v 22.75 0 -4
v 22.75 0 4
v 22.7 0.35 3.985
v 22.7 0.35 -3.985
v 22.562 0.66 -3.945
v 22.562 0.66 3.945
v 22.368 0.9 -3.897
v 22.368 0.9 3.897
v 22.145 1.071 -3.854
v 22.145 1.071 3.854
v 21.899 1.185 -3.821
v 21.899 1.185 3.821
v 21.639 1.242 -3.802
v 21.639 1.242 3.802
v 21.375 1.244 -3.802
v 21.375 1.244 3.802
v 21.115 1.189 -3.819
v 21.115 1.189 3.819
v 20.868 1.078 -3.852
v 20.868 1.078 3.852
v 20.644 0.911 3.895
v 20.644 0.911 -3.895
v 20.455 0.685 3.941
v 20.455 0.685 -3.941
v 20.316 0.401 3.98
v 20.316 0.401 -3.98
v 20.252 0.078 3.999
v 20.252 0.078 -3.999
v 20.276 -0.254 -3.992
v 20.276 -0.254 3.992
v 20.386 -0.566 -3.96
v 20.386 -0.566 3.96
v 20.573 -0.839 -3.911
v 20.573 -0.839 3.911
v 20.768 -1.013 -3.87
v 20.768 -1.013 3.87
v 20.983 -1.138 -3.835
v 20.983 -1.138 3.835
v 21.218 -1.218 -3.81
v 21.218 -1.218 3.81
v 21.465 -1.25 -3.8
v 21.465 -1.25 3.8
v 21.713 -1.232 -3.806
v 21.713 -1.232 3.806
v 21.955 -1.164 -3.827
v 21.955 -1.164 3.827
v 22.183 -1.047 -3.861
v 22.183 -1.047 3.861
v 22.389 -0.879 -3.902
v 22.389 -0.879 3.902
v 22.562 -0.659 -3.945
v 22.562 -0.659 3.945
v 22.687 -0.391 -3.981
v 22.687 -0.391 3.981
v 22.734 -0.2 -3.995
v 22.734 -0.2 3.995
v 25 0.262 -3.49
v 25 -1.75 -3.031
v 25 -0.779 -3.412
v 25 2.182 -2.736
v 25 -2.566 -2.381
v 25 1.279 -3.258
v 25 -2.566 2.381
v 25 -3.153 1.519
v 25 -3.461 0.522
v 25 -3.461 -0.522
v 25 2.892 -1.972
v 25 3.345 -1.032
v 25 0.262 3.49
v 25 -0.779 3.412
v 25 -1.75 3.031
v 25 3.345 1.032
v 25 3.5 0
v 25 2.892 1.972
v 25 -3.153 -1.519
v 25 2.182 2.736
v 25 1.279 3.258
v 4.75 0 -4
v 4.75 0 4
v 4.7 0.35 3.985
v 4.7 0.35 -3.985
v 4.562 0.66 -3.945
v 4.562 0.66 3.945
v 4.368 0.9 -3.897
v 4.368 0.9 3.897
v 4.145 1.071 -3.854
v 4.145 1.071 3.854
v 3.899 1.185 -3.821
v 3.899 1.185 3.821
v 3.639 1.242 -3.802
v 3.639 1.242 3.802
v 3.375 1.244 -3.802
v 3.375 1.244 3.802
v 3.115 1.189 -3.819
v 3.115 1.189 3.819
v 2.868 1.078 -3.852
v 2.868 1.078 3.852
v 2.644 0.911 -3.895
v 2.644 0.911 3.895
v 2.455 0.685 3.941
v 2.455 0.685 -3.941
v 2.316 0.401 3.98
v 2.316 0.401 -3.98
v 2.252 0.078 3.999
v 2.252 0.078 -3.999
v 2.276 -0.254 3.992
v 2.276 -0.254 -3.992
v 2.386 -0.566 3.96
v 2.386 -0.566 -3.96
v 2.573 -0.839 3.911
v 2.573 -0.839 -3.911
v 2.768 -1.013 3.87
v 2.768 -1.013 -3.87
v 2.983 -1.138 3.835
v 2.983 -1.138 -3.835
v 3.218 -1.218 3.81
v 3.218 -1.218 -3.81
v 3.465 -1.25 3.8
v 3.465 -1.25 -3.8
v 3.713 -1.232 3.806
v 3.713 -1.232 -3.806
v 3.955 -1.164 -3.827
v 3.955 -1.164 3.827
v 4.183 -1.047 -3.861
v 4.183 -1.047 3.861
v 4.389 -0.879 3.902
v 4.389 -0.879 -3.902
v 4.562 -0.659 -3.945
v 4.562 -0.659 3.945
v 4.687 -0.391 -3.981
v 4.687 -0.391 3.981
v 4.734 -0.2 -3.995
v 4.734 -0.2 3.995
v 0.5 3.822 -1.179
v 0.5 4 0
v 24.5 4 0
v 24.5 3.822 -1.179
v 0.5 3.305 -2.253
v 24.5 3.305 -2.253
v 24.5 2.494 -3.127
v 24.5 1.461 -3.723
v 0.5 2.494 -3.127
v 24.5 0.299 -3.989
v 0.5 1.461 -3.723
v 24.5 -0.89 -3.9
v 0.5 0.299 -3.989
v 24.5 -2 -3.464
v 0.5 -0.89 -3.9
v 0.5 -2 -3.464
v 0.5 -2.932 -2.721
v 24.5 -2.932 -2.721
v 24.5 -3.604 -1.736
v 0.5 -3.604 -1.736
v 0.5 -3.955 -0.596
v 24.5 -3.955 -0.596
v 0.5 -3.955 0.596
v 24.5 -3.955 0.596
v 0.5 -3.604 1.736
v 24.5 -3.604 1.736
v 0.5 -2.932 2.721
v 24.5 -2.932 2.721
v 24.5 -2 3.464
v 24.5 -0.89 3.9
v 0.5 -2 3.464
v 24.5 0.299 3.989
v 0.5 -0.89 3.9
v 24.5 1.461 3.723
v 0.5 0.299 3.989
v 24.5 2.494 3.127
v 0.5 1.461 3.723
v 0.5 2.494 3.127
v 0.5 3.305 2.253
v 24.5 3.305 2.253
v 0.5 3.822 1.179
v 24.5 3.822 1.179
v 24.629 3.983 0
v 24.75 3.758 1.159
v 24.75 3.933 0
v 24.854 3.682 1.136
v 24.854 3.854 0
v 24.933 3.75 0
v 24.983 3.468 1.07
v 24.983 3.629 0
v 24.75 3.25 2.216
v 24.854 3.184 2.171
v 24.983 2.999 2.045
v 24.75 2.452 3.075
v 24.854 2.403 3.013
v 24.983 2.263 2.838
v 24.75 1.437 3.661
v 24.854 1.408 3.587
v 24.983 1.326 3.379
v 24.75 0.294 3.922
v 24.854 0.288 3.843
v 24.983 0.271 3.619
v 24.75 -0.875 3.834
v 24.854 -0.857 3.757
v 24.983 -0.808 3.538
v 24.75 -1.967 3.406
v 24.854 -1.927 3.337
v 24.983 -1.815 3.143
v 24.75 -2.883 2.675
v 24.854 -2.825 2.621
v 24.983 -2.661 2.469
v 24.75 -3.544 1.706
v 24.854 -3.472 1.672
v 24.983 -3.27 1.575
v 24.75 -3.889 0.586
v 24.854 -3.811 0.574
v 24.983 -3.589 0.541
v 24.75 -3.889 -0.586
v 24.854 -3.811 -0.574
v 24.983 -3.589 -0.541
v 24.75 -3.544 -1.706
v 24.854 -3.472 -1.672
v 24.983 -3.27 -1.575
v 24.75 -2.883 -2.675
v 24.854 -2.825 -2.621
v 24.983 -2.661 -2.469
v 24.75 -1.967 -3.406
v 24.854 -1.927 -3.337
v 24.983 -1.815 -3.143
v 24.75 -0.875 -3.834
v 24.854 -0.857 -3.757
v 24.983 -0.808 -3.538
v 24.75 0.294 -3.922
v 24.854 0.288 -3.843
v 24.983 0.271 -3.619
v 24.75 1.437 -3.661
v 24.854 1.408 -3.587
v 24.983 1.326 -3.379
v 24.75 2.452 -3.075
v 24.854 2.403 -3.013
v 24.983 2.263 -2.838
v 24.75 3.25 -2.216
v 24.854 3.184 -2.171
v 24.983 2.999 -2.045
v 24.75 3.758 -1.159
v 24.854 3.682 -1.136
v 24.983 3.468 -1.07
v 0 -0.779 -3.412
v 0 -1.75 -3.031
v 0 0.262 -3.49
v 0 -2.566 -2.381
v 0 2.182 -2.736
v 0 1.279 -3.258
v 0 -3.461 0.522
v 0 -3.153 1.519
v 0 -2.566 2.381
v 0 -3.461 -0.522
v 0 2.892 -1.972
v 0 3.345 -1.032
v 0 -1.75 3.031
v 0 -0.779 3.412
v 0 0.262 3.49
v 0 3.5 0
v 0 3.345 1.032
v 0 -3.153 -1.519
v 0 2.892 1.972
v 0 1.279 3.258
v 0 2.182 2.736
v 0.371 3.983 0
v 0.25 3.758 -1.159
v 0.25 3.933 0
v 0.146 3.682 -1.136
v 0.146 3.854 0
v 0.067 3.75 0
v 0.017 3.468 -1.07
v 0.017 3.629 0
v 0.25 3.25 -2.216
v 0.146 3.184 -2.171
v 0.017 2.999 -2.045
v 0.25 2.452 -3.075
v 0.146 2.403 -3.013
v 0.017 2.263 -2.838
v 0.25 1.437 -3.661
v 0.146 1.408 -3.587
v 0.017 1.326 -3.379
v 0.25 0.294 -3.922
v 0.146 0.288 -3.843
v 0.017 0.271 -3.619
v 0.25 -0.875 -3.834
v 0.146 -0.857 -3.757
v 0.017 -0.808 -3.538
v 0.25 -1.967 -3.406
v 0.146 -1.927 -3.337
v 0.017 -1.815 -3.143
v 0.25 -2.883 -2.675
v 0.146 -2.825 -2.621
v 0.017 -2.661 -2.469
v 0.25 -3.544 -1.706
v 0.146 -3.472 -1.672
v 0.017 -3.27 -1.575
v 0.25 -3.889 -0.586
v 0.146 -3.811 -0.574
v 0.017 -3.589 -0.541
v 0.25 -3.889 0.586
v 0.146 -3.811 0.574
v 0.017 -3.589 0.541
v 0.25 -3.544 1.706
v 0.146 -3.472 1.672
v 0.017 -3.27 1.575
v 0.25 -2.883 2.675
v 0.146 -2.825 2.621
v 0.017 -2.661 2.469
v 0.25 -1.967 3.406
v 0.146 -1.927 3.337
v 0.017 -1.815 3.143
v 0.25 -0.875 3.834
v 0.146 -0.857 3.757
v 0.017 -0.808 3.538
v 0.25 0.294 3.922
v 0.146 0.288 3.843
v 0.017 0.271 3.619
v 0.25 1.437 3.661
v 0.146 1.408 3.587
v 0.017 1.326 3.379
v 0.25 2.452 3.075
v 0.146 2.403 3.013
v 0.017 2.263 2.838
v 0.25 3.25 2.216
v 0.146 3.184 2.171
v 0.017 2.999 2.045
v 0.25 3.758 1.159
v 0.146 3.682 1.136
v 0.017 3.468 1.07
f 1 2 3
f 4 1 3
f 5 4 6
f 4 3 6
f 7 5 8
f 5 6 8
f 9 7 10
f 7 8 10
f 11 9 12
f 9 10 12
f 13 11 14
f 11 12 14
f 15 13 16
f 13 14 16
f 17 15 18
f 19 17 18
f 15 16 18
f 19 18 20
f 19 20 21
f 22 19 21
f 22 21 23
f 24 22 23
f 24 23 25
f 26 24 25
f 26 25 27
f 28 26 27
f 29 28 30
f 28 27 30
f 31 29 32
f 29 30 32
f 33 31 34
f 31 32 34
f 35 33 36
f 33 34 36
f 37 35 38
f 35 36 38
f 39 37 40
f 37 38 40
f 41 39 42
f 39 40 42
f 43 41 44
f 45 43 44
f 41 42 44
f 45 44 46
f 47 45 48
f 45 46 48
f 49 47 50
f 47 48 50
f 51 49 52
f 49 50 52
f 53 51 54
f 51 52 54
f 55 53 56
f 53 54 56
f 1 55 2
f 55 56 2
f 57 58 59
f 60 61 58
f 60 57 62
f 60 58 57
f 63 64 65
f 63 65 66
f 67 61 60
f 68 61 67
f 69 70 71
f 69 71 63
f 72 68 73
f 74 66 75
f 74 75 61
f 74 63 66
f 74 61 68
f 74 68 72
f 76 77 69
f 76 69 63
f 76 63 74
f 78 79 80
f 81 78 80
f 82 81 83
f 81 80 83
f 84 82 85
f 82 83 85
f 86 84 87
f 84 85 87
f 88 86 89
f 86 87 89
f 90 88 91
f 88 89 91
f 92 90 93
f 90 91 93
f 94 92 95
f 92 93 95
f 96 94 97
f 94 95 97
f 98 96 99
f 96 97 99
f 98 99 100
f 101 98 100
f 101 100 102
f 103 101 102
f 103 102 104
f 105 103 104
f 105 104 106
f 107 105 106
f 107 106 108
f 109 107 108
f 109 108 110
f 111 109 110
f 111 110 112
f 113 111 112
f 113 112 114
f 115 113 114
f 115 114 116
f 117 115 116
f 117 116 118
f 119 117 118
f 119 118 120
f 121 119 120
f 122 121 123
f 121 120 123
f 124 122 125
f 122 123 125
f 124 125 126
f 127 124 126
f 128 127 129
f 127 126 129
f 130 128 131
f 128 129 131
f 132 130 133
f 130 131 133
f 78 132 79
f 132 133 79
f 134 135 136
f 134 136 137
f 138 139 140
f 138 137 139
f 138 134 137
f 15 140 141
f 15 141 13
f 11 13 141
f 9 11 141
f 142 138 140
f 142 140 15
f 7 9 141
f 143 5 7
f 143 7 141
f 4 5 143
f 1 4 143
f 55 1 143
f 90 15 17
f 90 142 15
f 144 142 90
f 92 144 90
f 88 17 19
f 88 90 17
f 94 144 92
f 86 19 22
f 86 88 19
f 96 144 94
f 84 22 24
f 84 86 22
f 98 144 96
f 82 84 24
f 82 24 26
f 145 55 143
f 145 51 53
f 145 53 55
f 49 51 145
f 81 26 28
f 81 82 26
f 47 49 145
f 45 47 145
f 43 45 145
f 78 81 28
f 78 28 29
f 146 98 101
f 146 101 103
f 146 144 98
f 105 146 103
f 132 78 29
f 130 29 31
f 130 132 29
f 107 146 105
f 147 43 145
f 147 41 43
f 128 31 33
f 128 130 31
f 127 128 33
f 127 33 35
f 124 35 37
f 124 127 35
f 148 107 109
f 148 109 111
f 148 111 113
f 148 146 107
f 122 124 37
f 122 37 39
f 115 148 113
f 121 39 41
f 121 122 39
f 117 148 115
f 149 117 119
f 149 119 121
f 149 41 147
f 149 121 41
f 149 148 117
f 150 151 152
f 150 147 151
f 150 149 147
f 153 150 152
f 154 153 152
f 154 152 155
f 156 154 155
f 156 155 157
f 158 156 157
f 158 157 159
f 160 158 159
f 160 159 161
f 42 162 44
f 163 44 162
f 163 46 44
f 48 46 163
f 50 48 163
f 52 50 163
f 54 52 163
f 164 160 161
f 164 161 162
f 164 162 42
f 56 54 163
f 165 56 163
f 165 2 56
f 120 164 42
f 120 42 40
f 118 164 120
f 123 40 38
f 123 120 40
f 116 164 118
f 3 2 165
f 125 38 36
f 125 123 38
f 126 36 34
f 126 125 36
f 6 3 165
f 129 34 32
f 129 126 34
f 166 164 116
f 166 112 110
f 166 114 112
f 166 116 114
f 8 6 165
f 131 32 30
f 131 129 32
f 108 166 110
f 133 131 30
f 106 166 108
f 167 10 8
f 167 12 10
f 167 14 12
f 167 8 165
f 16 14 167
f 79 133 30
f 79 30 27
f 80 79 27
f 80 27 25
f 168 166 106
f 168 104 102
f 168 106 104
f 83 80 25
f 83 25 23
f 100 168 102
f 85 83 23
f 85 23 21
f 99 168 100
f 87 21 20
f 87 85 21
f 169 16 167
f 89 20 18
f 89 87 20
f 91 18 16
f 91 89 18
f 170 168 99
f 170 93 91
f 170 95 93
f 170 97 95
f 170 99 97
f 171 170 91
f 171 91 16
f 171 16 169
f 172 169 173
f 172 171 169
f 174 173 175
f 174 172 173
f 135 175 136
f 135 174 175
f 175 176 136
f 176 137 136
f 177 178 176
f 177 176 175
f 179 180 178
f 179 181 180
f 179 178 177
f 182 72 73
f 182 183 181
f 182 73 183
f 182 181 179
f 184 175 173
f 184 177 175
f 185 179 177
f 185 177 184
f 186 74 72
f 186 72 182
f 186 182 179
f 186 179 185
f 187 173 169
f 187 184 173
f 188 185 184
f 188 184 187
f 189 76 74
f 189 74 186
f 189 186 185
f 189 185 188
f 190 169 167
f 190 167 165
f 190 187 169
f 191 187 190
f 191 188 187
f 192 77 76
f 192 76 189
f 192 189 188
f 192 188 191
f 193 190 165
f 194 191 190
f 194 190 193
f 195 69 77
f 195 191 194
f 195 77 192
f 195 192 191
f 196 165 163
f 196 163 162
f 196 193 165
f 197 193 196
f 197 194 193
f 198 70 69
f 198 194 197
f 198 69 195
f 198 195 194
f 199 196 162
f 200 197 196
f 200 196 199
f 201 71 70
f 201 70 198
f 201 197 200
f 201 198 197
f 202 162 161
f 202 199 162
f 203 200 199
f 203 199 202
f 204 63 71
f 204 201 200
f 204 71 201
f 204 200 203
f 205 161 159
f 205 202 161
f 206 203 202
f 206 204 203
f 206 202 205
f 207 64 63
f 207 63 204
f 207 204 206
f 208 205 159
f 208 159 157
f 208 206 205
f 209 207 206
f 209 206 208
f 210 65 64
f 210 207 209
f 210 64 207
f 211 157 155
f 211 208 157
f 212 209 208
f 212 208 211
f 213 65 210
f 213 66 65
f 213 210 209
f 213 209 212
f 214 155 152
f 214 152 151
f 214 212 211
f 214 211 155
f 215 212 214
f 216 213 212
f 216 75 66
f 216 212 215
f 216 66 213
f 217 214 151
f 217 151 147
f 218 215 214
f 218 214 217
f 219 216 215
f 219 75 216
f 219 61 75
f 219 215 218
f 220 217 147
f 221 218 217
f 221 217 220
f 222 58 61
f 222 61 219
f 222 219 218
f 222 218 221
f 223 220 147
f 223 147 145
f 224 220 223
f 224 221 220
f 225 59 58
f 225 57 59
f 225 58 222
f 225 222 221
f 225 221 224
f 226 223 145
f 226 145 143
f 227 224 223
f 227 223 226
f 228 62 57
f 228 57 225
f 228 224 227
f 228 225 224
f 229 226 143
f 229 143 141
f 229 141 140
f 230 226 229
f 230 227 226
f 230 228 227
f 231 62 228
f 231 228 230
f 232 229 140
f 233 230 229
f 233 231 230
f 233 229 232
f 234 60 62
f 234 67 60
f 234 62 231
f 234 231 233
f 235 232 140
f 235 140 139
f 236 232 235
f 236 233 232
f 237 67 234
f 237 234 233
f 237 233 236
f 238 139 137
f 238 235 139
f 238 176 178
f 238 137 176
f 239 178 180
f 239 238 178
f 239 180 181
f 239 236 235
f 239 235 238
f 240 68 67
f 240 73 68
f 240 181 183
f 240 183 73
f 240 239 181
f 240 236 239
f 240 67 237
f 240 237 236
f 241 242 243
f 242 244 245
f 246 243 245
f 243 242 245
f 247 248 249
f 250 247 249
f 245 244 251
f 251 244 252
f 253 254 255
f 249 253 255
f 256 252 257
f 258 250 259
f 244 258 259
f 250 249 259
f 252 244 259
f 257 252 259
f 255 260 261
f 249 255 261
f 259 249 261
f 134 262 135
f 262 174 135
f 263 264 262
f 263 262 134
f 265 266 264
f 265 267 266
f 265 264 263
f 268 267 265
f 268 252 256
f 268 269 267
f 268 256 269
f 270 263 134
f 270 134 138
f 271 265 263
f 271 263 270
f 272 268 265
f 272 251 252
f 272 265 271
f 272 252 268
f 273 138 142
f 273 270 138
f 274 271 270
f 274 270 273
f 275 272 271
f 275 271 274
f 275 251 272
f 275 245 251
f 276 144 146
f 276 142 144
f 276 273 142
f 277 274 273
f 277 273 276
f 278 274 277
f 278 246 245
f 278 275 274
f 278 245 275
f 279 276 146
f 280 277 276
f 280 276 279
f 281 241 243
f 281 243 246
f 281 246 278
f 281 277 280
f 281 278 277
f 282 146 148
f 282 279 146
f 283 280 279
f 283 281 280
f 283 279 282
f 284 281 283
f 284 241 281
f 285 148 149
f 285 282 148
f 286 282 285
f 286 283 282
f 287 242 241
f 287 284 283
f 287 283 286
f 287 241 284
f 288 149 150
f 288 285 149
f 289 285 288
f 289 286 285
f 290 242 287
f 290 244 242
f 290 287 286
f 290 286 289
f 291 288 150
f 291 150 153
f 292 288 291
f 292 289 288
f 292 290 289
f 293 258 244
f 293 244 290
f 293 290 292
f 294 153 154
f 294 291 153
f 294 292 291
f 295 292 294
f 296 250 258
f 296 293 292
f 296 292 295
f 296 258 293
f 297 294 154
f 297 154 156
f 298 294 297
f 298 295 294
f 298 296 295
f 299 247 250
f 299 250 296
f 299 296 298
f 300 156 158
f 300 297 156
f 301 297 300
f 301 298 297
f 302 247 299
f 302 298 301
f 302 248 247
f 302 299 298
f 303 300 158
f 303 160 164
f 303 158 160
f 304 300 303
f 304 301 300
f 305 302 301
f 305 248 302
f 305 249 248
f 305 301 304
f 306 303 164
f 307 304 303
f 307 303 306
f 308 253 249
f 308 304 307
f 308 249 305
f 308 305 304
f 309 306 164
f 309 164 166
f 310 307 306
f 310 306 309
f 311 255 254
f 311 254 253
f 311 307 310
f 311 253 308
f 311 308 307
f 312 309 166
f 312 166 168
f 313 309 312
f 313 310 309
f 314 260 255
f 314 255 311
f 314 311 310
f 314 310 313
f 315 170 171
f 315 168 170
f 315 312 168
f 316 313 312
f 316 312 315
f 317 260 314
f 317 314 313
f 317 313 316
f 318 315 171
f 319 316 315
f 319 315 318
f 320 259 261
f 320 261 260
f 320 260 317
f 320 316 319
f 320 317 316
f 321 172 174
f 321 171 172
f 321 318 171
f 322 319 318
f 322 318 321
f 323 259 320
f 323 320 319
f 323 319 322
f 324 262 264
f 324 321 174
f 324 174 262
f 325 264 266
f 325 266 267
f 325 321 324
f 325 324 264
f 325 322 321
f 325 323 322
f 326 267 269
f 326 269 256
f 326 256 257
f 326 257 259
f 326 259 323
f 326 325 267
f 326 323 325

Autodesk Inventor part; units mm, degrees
ref_plane "YZ Plane" through (0, 0, 0) normal (1, 0, 0) x (0, 1, 0)
ref_plane "XZ Plane" through (0, 0, 0) normal (0, 1, 0) x (-1, 0, 0)
sketch "Sketch1" plane through (0, 0, 0) normal (1, 0, 0) x (0, 1, 0)
  circle A0 centre (0, 0) radius 4
  dimension "d0" = 8
extrude "Extrusion1" add sketch "Sketch1" along normal blind 25
fillet "Fillet1" radius 0.5 2 edges at (0, -4, 0) (25, -4, 0)
ref_plane "Work Plane1" through (0, 0, 4.7625) normal (0, 0, 1) x (1, 0, 0)
sketch "Sketch2" plane through (0, 0, 4.7625) normal (0, 0, 1) x (1, 0, 0)
  line L0 (0.5, 4) -> (24.5, 4) construction
  line L1 (12.5, 4) -> (12.5, 0) construction
  line L2 (12.5, 0) -> (21.5, 0) construction
  circle A0 centre (21.5, 0) radius 1.25 construction
  line L3 (12.5, 0) -> (3.5, 0) construction
  circle A1 centre (3.5, 0) radius 1.25 construction
  circle A2 centre (3.5, 0) radius 1.25
  circle A3 centre (21.5, 0) radius 1.25
  point P0 (0, 0)
  dimension "d5" = 9
  dimension "d6" = 2.5
  dimension "d7" = 9
  dimension "d8" = 2.5
  dimension "d9" = 4
extrude "Extrusion2" cut sketch "Sketch2" against normal blind 25
properties part number "Crankshaft Center Rod"
